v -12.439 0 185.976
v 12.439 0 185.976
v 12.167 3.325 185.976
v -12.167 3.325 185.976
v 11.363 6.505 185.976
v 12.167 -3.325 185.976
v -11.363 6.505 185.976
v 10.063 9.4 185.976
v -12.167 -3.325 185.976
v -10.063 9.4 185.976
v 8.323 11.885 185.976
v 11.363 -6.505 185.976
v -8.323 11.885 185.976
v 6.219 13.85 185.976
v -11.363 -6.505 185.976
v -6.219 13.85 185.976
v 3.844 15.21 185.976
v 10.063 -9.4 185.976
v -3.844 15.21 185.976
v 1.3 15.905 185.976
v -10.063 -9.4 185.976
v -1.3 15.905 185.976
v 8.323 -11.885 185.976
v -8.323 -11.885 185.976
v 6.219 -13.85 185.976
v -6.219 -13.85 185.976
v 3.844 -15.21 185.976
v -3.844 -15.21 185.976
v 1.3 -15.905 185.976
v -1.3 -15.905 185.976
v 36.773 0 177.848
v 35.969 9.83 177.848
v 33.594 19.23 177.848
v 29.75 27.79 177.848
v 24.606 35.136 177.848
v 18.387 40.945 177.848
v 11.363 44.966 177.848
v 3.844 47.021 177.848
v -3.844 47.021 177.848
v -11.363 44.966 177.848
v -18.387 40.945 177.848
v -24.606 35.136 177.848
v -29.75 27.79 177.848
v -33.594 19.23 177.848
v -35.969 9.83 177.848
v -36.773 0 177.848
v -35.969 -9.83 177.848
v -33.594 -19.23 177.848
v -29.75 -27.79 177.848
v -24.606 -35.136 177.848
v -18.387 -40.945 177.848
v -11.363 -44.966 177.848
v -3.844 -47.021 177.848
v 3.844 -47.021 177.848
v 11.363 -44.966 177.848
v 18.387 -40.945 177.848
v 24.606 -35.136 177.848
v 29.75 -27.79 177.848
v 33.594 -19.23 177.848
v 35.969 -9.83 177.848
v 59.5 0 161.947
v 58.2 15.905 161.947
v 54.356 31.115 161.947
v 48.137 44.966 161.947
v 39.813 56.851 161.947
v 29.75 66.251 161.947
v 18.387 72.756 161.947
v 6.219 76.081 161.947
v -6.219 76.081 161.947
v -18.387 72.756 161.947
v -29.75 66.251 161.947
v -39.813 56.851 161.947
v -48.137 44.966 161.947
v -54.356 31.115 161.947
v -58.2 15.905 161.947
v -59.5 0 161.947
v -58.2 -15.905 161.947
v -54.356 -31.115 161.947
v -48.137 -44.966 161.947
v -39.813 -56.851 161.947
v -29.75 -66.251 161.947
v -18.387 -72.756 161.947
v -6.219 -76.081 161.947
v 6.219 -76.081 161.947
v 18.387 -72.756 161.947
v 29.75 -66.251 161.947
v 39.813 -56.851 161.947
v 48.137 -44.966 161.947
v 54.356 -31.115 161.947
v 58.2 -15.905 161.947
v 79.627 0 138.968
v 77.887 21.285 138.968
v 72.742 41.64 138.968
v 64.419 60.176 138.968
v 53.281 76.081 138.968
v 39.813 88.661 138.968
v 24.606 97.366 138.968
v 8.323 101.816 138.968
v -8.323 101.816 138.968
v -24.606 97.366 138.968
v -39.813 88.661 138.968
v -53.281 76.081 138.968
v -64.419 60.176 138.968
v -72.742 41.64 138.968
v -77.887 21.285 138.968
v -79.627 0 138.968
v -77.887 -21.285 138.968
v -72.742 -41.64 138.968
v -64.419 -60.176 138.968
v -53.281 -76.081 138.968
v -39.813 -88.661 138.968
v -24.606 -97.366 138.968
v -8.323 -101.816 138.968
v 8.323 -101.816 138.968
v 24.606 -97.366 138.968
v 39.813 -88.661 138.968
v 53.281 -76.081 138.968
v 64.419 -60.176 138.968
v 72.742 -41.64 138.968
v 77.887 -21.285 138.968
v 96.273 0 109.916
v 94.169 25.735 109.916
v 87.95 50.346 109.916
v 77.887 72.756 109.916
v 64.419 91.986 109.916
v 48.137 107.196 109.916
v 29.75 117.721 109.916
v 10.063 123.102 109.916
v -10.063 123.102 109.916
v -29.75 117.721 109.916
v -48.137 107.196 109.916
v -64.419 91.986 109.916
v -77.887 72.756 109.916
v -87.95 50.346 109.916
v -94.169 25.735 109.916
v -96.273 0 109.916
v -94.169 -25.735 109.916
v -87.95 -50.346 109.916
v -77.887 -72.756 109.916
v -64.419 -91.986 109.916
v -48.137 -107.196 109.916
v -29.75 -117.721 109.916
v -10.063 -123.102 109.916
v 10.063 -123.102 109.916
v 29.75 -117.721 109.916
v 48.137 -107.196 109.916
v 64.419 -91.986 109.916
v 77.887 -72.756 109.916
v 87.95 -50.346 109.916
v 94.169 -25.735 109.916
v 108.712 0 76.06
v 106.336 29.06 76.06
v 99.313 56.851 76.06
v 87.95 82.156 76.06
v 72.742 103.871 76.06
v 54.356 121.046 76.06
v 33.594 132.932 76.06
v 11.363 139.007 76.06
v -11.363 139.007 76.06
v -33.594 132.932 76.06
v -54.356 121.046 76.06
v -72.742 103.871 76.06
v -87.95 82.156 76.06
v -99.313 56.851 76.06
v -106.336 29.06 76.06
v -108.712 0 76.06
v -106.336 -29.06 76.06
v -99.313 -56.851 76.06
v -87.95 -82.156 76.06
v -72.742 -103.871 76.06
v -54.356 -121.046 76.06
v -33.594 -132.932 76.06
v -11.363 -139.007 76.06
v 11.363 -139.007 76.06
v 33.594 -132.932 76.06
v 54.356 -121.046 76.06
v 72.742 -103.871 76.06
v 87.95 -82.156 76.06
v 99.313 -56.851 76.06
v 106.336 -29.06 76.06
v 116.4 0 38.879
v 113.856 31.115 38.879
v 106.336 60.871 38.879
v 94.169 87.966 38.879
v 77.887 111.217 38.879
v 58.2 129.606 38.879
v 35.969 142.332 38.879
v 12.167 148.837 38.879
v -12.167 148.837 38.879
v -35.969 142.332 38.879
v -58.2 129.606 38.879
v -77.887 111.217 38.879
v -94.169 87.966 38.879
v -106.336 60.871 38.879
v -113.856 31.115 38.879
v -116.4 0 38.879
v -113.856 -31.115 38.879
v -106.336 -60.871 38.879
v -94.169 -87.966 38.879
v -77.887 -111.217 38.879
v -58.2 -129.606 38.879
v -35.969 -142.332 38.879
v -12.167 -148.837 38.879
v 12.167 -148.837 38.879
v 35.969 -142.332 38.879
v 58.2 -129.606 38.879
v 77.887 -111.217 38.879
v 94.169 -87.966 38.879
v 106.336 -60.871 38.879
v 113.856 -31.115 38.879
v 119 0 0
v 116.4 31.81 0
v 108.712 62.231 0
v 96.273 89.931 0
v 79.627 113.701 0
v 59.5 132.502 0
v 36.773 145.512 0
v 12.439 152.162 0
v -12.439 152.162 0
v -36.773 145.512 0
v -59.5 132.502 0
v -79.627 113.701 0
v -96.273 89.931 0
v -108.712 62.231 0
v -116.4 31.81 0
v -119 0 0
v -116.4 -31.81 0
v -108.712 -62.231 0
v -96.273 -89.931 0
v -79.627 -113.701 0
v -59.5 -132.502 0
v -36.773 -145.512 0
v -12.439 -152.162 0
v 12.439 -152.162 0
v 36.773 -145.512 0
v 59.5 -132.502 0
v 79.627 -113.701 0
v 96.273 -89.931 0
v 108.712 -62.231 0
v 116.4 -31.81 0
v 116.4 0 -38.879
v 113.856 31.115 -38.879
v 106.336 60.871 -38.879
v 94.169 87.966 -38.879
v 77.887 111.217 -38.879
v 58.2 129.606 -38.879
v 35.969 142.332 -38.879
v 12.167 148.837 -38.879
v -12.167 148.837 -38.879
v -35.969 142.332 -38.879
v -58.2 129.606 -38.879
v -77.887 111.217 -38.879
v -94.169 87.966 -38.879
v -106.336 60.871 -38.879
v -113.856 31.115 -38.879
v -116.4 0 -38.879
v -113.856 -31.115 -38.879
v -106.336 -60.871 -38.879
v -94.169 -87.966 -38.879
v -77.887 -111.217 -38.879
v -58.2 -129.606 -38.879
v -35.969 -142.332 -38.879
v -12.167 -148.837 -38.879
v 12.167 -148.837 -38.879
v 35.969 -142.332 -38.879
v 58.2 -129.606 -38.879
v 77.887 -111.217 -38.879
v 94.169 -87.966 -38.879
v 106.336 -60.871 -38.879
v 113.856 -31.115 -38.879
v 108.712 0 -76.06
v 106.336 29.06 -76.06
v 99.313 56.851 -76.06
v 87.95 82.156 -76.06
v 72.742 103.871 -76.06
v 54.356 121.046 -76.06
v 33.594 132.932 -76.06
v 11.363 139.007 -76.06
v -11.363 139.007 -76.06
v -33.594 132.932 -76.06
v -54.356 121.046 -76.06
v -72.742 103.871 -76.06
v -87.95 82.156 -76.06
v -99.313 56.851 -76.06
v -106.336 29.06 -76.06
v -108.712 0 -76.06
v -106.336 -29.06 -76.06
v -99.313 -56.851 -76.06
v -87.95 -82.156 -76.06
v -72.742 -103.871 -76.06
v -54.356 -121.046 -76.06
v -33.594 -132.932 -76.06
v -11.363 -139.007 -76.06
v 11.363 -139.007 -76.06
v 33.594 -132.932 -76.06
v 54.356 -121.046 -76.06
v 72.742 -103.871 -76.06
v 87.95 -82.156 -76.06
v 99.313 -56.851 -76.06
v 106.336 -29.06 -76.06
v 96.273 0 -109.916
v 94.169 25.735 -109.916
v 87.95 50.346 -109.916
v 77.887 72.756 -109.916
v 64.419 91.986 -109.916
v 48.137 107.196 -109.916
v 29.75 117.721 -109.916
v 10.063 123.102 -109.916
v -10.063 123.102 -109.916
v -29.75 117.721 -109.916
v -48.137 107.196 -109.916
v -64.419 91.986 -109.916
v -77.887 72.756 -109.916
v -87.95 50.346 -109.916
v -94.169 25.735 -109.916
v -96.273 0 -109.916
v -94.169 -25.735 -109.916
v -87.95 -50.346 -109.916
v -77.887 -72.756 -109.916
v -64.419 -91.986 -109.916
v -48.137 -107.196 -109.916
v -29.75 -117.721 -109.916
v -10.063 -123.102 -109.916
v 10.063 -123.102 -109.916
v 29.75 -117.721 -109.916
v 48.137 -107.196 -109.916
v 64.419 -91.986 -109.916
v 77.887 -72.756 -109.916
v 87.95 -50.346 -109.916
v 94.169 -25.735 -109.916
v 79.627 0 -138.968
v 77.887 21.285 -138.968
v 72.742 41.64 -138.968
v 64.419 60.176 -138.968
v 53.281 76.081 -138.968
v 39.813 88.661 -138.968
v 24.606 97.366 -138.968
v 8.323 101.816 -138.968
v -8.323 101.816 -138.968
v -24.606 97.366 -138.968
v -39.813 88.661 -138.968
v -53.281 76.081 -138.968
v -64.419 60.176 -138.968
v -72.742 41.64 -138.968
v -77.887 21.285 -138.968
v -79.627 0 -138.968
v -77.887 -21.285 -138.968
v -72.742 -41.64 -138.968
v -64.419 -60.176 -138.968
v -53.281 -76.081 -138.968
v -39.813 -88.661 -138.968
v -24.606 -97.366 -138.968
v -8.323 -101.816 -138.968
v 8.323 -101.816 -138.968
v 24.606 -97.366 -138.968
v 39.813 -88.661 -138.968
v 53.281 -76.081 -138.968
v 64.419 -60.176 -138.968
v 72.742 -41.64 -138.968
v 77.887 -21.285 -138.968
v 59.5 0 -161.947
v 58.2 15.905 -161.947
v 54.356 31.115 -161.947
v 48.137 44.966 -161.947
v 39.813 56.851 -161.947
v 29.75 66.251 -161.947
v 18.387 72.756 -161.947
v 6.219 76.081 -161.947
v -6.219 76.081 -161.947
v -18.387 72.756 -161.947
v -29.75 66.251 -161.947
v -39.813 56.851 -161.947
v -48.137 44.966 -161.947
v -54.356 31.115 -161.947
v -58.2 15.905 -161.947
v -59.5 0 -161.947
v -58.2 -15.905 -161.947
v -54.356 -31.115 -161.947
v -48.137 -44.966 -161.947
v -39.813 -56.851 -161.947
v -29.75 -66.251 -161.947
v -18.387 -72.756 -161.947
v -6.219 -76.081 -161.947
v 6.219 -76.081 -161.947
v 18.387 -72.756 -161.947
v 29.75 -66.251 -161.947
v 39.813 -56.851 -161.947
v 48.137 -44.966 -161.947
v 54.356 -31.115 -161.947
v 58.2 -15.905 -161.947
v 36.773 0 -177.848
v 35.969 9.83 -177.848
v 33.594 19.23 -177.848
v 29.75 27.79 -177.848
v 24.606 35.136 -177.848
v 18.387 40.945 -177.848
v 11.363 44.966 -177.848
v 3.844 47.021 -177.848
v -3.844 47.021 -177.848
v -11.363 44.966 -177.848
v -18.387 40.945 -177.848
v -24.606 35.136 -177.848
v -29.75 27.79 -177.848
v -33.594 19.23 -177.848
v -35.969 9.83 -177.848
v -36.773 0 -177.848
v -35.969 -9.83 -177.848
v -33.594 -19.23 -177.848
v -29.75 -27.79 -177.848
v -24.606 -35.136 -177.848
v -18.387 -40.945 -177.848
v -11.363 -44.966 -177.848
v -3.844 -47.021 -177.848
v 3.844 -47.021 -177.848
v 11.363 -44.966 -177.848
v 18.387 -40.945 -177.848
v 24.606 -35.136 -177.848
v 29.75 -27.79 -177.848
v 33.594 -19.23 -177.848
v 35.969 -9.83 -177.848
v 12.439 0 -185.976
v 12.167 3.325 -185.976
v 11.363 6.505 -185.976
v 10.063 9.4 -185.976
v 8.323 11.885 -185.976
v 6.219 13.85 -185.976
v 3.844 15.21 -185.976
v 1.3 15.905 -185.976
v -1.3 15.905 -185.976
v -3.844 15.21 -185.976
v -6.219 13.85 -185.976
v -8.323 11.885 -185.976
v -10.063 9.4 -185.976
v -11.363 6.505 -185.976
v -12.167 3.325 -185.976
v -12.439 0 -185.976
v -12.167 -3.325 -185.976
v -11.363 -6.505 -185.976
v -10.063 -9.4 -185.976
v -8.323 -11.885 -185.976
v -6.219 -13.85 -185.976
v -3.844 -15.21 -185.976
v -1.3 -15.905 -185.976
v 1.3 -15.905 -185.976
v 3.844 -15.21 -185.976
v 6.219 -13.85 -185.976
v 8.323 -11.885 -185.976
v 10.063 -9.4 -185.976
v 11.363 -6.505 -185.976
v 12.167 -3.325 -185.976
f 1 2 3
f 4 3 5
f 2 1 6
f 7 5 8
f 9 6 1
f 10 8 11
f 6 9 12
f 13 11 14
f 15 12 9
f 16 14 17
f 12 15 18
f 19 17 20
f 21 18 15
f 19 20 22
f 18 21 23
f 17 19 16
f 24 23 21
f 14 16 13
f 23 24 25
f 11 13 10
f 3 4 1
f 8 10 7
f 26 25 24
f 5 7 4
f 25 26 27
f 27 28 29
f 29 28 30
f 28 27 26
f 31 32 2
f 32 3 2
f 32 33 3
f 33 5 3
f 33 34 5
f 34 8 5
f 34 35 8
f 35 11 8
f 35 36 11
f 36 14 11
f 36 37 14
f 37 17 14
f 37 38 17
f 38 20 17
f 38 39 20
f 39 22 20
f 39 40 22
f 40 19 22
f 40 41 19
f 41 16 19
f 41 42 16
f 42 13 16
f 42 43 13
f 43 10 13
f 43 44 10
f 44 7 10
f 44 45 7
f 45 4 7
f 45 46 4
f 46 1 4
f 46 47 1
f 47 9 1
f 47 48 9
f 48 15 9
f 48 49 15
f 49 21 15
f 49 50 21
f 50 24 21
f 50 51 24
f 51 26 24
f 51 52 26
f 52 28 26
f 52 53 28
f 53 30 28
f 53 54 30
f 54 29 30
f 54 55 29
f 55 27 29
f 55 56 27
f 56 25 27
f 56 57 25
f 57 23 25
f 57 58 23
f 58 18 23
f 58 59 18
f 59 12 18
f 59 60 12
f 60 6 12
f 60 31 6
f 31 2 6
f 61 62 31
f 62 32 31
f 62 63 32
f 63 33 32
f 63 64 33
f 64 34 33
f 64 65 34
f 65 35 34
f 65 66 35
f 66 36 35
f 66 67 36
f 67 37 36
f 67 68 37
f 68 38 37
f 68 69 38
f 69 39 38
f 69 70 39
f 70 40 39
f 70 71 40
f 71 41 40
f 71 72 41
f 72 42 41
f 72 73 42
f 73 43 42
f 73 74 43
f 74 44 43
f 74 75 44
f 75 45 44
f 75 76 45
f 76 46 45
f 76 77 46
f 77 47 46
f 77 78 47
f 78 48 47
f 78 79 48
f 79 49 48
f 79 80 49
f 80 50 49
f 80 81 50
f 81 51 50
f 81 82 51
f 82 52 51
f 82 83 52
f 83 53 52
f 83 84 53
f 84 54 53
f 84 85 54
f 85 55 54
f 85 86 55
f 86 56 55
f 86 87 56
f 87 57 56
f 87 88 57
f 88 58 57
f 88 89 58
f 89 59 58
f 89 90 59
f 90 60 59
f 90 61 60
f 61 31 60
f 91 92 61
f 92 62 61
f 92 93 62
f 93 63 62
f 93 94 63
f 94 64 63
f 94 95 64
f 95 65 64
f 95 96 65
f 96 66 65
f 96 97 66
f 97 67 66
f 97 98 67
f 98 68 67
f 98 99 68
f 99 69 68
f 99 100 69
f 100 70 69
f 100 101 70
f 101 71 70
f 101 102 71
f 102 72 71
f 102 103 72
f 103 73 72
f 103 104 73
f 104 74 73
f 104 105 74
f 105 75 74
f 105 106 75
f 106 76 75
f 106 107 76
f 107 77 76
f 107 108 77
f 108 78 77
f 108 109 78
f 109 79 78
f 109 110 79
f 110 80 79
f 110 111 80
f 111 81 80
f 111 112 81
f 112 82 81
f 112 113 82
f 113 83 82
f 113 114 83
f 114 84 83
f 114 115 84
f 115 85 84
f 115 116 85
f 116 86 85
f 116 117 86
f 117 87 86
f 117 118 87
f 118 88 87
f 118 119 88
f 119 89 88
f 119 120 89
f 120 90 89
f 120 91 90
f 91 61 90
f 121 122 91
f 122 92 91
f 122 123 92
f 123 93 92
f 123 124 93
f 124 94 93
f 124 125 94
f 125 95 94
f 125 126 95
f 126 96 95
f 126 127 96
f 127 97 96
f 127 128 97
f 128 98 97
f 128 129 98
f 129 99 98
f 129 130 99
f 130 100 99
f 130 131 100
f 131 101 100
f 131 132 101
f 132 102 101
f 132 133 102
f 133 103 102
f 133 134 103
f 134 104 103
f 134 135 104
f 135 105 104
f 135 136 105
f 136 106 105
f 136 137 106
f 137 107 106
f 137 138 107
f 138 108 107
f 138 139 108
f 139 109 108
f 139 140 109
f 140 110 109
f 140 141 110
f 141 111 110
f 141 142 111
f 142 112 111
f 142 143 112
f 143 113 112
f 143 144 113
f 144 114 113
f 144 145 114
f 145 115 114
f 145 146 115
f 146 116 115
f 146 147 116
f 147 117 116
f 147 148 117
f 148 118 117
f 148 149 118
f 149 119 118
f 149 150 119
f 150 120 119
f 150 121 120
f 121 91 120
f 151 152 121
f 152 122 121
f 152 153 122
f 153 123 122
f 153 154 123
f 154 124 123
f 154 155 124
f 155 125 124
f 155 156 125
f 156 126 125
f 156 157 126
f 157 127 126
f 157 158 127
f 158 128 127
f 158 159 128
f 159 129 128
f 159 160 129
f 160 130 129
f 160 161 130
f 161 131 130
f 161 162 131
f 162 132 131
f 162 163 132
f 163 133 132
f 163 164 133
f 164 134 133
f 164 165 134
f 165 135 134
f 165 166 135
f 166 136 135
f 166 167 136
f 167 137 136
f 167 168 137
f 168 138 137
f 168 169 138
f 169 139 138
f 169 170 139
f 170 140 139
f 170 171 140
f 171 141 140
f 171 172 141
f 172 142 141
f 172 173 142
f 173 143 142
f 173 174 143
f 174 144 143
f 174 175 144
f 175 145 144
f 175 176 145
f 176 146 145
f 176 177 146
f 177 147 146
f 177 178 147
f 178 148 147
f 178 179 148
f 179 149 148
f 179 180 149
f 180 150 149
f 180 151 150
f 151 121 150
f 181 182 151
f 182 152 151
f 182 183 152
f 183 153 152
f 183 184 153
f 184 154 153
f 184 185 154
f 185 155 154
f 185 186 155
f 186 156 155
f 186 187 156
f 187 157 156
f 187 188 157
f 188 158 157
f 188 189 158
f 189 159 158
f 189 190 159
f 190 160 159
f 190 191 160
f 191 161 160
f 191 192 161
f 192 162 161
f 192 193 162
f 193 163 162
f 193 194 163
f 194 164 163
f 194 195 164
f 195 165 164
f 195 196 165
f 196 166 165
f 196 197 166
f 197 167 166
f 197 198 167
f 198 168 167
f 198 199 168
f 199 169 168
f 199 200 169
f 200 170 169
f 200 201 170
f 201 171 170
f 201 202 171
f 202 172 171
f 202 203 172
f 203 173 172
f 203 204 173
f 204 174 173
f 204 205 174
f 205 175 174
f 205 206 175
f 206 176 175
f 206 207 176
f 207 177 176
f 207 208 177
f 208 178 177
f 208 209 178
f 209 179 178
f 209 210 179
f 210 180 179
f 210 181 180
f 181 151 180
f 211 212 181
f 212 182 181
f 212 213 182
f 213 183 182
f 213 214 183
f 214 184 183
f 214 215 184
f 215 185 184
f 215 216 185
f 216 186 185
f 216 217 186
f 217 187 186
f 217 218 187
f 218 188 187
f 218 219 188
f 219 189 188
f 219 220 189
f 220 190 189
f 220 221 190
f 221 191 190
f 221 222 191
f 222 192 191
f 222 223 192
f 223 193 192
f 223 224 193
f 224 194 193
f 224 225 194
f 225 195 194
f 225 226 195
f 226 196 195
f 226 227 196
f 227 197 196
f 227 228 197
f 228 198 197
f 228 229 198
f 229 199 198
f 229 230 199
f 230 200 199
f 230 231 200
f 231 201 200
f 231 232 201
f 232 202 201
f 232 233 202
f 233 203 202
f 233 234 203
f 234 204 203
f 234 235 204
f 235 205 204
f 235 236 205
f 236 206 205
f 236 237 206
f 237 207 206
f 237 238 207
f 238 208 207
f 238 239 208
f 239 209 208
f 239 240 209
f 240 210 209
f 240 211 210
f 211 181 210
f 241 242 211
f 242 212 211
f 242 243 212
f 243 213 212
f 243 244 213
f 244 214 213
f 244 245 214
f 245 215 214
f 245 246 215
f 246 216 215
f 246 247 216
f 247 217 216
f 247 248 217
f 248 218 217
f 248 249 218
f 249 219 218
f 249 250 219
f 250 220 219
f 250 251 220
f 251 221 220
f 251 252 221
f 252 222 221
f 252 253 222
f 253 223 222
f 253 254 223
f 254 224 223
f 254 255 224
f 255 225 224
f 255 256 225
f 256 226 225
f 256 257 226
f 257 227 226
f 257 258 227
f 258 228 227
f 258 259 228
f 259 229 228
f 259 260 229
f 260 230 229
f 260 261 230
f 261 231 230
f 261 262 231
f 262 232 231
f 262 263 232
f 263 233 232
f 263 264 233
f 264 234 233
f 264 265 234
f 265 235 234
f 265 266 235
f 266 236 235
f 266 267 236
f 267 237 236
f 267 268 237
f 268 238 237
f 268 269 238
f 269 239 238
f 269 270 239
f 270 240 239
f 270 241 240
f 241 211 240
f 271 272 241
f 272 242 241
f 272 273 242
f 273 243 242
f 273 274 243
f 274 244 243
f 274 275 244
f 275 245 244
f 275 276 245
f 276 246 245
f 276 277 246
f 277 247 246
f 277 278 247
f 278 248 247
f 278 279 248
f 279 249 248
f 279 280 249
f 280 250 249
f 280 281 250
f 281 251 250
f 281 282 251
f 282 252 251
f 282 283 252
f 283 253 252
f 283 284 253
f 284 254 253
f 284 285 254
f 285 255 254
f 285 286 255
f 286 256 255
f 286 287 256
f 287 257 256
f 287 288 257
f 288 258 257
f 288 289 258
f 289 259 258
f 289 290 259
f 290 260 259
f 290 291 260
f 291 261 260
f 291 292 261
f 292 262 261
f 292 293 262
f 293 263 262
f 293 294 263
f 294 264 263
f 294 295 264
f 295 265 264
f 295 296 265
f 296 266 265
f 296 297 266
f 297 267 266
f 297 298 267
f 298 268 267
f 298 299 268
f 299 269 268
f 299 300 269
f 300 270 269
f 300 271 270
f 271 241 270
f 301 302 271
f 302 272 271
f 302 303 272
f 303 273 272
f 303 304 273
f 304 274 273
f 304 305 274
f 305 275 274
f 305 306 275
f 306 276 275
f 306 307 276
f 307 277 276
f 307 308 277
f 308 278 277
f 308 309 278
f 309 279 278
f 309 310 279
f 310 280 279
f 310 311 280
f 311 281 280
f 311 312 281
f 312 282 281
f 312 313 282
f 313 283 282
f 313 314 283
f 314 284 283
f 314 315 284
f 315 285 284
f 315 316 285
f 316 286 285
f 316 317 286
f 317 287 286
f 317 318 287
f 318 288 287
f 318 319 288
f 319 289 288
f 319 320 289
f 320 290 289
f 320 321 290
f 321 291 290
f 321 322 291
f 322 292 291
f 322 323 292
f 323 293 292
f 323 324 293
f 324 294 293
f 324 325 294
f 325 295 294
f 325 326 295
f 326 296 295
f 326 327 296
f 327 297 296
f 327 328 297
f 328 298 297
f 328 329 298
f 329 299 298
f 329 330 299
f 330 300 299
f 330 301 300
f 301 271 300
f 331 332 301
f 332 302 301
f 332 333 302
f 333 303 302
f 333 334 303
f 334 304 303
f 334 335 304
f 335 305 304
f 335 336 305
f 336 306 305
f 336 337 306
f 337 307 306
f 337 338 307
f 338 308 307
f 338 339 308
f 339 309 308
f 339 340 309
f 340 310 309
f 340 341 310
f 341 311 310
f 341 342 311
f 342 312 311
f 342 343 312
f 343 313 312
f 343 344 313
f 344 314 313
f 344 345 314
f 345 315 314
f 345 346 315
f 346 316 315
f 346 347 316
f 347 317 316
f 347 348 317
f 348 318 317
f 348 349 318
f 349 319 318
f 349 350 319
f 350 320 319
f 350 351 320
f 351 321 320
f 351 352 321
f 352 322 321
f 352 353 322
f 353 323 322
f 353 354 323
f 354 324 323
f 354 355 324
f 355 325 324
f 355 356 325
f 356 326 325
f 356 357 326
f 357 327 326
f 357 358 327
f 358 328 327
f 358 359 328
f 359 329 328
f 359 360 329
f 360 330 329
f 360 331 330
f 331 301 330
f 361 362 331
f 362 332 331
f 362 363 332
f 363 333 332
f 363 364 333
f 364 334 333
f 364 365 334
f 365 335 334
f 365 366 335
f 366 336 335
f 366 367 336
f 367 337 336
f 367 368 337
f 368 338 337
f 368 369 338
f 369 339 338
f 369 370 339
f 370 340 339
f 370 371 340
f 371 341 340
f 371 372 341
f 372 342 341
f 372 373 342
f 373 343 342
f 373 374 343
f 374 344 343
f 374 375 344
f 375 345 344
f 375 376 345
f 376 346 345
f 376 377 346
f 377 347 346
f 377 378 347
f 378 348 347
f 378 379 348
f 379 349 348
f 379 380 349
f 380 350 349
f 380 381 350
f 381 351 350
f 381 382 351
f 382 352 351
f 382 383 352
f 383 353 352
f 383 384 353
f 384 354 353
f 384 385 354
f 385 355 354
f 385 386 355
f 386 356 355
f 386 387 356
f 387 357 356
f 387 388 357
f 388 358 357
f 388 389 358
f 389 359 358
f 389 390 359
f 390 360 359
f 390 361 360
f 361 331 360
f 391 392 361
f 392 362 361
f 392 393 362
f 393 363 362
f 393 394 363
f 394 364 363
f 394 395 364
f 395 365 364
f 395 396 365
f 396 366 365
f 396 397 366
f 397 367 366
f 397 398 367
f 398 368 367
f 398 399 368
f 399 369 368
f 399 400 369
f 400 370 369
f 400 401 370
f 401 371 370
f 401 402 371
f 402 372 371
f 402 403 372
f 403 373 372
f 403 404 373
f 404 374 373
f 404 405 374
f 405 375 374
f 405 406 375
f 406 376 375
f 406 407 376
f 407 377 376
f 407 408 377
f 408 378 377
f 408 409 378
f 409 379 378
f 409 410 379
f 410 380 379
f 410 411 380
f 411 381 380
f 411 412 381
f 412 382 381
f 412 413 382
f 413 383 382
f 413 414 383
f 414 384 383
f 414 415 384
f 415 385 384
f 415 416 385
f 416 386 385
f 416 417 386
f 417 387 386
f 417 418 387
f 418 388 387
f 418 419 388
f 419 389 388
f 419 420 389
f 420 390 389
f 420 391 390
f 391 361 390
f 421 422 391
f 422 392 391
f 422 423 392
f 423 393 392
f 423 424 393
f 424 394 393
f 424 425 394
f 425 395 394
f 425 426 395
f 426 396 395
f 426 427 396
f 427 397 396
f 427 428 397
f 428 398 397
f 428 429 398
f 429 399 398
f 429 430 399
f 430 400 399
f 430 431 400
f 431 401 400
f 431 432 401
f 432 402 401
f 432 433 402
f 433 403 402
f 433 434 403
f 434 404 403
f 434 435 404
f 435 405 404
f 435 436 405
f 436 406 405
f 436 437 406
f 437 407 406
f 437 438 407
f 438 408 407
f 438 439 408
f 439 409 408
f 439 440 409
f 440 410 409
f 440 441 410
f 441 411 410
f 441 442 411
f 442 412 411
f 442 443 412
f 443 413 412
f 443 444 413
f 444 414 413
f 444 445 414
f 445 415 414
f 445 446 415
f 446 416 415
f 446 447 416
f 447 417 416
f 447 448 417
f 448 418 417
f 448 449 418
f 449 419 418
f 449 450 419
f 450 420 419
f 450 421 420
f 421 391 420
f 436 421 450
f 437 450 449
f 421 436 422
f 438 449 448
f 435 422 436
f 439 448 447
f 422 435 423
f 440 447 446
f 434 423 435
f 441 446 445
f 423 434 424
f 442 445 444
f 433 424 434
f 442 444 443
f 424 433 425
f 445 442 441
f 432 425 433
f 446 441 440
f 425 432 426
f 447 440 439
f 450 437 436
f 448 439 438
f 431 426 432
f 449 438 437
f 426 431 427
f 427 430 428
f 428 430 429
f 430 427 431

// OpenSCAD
// Generated by SolidPython 1.0.1 on 2020-07-29 00:46:47


scale(v = [7, 9, 11]) {
	sphere(r = 17);
}
/***********************************************
*********      SolidPython code:      **********
************************************************
 
# import packages: SolidPython
from solid import *
from solid.utils import *
from itertools import chain, combinations, permutations


class Resize:

    def __init__(self, scad_file):
        self.scad_file = scad_file
        #self.scad_file = import_scad(scad_file)
        # cone/cylinder param:
        self.r1 = 0
        self.r2 = 0
        self.h = 0
        # rectangular prism param:
        self.w = 0
        self.l = 0
        # ellipse param:
        self.r = 0

    # import OpenScad code (file name corresponds to shape)


    # classify shape + parameters
    def assign(self, param1, param2, param3):
        if self.scad_file == 'cone.scad':
            self.r1 = param1
            self.r2 = param2
            self.h = param3
        elif self.scad_file == 'cylinder.scad':
            self.r1 = param1
            self.r2 = param2
            self.h = param3
        elif self.scad_file == 'rectangularPrism.scad':
            self.h = param1
            self.l = param2
            self.w = param3
        else:
            self.r = param1
            self.h = param2

    # resize parameters
    def iterate(self):
        x = range(3, 20, 2)
        i = 1
        if self.scad_file == 'cone.scad':
            tempList = list(permutations(x, 2))
            for temp in tempList:
                param1 = temp[0]
                param2 = temp[1]
                filepath = 'produced_scad_files/' + 'cone' + str(param1) + '_' + str(param2) + '_' + '.scad'
                scad_render_to_file(cylinder(h=param1, r1=param2, r2=0), filepath)

        elif self.scad_file == 'cylinder.scad':
            tempList = list(permutations(x, 3))
            for temp in tempList:
                param1 = temp[0]
                param2 = temp[1]
                filepath = 'produced_scad_files/' + 'cylinder' + str(param1) + '_' + str(param2) + '_' + '.scad'
                scad_render_to_file(cylinder(h=param1, r1=param2, r2=param2), filepath)

        elif self.scad_file == 'rectangularPrism.scad':
            tempList = list(permutations(x, 3))
            for temp in tempList:
                param1 = temp[0]
                param2 = temp[1]
                param3 = temp[2]
                filepath = 'produced_scad_files/' + 'rectangularPrism' + str(param1) + '_' + str(param2) + '_' + str(
                    param3) + '.scad'
                scad_render_to_file(cube(size=(param1, param2, param3)), filepath)

        elif self.scad_file == 'ellipse.scad':
            tempList = list(permutations(x, 4))
            for temp in tempList:
                param1 = temp[0]
                param2 = temp[1]
                param3 = temp[2]
                param4 = temp[3]
                filepath = 'produced_scad_files/' + 'ellipse' + str(param1) + '_' + str(param2) + '_' + str(param3) + '_' + str(param4) + '.scad'
                scad_render_to_file(scale([param1, param2, param3])(sphere(r=param4)), filepath)

    def render_to_scadfile(self):
        scad_render_to_file(scad, 'example.scad') 
 
************************************************/
